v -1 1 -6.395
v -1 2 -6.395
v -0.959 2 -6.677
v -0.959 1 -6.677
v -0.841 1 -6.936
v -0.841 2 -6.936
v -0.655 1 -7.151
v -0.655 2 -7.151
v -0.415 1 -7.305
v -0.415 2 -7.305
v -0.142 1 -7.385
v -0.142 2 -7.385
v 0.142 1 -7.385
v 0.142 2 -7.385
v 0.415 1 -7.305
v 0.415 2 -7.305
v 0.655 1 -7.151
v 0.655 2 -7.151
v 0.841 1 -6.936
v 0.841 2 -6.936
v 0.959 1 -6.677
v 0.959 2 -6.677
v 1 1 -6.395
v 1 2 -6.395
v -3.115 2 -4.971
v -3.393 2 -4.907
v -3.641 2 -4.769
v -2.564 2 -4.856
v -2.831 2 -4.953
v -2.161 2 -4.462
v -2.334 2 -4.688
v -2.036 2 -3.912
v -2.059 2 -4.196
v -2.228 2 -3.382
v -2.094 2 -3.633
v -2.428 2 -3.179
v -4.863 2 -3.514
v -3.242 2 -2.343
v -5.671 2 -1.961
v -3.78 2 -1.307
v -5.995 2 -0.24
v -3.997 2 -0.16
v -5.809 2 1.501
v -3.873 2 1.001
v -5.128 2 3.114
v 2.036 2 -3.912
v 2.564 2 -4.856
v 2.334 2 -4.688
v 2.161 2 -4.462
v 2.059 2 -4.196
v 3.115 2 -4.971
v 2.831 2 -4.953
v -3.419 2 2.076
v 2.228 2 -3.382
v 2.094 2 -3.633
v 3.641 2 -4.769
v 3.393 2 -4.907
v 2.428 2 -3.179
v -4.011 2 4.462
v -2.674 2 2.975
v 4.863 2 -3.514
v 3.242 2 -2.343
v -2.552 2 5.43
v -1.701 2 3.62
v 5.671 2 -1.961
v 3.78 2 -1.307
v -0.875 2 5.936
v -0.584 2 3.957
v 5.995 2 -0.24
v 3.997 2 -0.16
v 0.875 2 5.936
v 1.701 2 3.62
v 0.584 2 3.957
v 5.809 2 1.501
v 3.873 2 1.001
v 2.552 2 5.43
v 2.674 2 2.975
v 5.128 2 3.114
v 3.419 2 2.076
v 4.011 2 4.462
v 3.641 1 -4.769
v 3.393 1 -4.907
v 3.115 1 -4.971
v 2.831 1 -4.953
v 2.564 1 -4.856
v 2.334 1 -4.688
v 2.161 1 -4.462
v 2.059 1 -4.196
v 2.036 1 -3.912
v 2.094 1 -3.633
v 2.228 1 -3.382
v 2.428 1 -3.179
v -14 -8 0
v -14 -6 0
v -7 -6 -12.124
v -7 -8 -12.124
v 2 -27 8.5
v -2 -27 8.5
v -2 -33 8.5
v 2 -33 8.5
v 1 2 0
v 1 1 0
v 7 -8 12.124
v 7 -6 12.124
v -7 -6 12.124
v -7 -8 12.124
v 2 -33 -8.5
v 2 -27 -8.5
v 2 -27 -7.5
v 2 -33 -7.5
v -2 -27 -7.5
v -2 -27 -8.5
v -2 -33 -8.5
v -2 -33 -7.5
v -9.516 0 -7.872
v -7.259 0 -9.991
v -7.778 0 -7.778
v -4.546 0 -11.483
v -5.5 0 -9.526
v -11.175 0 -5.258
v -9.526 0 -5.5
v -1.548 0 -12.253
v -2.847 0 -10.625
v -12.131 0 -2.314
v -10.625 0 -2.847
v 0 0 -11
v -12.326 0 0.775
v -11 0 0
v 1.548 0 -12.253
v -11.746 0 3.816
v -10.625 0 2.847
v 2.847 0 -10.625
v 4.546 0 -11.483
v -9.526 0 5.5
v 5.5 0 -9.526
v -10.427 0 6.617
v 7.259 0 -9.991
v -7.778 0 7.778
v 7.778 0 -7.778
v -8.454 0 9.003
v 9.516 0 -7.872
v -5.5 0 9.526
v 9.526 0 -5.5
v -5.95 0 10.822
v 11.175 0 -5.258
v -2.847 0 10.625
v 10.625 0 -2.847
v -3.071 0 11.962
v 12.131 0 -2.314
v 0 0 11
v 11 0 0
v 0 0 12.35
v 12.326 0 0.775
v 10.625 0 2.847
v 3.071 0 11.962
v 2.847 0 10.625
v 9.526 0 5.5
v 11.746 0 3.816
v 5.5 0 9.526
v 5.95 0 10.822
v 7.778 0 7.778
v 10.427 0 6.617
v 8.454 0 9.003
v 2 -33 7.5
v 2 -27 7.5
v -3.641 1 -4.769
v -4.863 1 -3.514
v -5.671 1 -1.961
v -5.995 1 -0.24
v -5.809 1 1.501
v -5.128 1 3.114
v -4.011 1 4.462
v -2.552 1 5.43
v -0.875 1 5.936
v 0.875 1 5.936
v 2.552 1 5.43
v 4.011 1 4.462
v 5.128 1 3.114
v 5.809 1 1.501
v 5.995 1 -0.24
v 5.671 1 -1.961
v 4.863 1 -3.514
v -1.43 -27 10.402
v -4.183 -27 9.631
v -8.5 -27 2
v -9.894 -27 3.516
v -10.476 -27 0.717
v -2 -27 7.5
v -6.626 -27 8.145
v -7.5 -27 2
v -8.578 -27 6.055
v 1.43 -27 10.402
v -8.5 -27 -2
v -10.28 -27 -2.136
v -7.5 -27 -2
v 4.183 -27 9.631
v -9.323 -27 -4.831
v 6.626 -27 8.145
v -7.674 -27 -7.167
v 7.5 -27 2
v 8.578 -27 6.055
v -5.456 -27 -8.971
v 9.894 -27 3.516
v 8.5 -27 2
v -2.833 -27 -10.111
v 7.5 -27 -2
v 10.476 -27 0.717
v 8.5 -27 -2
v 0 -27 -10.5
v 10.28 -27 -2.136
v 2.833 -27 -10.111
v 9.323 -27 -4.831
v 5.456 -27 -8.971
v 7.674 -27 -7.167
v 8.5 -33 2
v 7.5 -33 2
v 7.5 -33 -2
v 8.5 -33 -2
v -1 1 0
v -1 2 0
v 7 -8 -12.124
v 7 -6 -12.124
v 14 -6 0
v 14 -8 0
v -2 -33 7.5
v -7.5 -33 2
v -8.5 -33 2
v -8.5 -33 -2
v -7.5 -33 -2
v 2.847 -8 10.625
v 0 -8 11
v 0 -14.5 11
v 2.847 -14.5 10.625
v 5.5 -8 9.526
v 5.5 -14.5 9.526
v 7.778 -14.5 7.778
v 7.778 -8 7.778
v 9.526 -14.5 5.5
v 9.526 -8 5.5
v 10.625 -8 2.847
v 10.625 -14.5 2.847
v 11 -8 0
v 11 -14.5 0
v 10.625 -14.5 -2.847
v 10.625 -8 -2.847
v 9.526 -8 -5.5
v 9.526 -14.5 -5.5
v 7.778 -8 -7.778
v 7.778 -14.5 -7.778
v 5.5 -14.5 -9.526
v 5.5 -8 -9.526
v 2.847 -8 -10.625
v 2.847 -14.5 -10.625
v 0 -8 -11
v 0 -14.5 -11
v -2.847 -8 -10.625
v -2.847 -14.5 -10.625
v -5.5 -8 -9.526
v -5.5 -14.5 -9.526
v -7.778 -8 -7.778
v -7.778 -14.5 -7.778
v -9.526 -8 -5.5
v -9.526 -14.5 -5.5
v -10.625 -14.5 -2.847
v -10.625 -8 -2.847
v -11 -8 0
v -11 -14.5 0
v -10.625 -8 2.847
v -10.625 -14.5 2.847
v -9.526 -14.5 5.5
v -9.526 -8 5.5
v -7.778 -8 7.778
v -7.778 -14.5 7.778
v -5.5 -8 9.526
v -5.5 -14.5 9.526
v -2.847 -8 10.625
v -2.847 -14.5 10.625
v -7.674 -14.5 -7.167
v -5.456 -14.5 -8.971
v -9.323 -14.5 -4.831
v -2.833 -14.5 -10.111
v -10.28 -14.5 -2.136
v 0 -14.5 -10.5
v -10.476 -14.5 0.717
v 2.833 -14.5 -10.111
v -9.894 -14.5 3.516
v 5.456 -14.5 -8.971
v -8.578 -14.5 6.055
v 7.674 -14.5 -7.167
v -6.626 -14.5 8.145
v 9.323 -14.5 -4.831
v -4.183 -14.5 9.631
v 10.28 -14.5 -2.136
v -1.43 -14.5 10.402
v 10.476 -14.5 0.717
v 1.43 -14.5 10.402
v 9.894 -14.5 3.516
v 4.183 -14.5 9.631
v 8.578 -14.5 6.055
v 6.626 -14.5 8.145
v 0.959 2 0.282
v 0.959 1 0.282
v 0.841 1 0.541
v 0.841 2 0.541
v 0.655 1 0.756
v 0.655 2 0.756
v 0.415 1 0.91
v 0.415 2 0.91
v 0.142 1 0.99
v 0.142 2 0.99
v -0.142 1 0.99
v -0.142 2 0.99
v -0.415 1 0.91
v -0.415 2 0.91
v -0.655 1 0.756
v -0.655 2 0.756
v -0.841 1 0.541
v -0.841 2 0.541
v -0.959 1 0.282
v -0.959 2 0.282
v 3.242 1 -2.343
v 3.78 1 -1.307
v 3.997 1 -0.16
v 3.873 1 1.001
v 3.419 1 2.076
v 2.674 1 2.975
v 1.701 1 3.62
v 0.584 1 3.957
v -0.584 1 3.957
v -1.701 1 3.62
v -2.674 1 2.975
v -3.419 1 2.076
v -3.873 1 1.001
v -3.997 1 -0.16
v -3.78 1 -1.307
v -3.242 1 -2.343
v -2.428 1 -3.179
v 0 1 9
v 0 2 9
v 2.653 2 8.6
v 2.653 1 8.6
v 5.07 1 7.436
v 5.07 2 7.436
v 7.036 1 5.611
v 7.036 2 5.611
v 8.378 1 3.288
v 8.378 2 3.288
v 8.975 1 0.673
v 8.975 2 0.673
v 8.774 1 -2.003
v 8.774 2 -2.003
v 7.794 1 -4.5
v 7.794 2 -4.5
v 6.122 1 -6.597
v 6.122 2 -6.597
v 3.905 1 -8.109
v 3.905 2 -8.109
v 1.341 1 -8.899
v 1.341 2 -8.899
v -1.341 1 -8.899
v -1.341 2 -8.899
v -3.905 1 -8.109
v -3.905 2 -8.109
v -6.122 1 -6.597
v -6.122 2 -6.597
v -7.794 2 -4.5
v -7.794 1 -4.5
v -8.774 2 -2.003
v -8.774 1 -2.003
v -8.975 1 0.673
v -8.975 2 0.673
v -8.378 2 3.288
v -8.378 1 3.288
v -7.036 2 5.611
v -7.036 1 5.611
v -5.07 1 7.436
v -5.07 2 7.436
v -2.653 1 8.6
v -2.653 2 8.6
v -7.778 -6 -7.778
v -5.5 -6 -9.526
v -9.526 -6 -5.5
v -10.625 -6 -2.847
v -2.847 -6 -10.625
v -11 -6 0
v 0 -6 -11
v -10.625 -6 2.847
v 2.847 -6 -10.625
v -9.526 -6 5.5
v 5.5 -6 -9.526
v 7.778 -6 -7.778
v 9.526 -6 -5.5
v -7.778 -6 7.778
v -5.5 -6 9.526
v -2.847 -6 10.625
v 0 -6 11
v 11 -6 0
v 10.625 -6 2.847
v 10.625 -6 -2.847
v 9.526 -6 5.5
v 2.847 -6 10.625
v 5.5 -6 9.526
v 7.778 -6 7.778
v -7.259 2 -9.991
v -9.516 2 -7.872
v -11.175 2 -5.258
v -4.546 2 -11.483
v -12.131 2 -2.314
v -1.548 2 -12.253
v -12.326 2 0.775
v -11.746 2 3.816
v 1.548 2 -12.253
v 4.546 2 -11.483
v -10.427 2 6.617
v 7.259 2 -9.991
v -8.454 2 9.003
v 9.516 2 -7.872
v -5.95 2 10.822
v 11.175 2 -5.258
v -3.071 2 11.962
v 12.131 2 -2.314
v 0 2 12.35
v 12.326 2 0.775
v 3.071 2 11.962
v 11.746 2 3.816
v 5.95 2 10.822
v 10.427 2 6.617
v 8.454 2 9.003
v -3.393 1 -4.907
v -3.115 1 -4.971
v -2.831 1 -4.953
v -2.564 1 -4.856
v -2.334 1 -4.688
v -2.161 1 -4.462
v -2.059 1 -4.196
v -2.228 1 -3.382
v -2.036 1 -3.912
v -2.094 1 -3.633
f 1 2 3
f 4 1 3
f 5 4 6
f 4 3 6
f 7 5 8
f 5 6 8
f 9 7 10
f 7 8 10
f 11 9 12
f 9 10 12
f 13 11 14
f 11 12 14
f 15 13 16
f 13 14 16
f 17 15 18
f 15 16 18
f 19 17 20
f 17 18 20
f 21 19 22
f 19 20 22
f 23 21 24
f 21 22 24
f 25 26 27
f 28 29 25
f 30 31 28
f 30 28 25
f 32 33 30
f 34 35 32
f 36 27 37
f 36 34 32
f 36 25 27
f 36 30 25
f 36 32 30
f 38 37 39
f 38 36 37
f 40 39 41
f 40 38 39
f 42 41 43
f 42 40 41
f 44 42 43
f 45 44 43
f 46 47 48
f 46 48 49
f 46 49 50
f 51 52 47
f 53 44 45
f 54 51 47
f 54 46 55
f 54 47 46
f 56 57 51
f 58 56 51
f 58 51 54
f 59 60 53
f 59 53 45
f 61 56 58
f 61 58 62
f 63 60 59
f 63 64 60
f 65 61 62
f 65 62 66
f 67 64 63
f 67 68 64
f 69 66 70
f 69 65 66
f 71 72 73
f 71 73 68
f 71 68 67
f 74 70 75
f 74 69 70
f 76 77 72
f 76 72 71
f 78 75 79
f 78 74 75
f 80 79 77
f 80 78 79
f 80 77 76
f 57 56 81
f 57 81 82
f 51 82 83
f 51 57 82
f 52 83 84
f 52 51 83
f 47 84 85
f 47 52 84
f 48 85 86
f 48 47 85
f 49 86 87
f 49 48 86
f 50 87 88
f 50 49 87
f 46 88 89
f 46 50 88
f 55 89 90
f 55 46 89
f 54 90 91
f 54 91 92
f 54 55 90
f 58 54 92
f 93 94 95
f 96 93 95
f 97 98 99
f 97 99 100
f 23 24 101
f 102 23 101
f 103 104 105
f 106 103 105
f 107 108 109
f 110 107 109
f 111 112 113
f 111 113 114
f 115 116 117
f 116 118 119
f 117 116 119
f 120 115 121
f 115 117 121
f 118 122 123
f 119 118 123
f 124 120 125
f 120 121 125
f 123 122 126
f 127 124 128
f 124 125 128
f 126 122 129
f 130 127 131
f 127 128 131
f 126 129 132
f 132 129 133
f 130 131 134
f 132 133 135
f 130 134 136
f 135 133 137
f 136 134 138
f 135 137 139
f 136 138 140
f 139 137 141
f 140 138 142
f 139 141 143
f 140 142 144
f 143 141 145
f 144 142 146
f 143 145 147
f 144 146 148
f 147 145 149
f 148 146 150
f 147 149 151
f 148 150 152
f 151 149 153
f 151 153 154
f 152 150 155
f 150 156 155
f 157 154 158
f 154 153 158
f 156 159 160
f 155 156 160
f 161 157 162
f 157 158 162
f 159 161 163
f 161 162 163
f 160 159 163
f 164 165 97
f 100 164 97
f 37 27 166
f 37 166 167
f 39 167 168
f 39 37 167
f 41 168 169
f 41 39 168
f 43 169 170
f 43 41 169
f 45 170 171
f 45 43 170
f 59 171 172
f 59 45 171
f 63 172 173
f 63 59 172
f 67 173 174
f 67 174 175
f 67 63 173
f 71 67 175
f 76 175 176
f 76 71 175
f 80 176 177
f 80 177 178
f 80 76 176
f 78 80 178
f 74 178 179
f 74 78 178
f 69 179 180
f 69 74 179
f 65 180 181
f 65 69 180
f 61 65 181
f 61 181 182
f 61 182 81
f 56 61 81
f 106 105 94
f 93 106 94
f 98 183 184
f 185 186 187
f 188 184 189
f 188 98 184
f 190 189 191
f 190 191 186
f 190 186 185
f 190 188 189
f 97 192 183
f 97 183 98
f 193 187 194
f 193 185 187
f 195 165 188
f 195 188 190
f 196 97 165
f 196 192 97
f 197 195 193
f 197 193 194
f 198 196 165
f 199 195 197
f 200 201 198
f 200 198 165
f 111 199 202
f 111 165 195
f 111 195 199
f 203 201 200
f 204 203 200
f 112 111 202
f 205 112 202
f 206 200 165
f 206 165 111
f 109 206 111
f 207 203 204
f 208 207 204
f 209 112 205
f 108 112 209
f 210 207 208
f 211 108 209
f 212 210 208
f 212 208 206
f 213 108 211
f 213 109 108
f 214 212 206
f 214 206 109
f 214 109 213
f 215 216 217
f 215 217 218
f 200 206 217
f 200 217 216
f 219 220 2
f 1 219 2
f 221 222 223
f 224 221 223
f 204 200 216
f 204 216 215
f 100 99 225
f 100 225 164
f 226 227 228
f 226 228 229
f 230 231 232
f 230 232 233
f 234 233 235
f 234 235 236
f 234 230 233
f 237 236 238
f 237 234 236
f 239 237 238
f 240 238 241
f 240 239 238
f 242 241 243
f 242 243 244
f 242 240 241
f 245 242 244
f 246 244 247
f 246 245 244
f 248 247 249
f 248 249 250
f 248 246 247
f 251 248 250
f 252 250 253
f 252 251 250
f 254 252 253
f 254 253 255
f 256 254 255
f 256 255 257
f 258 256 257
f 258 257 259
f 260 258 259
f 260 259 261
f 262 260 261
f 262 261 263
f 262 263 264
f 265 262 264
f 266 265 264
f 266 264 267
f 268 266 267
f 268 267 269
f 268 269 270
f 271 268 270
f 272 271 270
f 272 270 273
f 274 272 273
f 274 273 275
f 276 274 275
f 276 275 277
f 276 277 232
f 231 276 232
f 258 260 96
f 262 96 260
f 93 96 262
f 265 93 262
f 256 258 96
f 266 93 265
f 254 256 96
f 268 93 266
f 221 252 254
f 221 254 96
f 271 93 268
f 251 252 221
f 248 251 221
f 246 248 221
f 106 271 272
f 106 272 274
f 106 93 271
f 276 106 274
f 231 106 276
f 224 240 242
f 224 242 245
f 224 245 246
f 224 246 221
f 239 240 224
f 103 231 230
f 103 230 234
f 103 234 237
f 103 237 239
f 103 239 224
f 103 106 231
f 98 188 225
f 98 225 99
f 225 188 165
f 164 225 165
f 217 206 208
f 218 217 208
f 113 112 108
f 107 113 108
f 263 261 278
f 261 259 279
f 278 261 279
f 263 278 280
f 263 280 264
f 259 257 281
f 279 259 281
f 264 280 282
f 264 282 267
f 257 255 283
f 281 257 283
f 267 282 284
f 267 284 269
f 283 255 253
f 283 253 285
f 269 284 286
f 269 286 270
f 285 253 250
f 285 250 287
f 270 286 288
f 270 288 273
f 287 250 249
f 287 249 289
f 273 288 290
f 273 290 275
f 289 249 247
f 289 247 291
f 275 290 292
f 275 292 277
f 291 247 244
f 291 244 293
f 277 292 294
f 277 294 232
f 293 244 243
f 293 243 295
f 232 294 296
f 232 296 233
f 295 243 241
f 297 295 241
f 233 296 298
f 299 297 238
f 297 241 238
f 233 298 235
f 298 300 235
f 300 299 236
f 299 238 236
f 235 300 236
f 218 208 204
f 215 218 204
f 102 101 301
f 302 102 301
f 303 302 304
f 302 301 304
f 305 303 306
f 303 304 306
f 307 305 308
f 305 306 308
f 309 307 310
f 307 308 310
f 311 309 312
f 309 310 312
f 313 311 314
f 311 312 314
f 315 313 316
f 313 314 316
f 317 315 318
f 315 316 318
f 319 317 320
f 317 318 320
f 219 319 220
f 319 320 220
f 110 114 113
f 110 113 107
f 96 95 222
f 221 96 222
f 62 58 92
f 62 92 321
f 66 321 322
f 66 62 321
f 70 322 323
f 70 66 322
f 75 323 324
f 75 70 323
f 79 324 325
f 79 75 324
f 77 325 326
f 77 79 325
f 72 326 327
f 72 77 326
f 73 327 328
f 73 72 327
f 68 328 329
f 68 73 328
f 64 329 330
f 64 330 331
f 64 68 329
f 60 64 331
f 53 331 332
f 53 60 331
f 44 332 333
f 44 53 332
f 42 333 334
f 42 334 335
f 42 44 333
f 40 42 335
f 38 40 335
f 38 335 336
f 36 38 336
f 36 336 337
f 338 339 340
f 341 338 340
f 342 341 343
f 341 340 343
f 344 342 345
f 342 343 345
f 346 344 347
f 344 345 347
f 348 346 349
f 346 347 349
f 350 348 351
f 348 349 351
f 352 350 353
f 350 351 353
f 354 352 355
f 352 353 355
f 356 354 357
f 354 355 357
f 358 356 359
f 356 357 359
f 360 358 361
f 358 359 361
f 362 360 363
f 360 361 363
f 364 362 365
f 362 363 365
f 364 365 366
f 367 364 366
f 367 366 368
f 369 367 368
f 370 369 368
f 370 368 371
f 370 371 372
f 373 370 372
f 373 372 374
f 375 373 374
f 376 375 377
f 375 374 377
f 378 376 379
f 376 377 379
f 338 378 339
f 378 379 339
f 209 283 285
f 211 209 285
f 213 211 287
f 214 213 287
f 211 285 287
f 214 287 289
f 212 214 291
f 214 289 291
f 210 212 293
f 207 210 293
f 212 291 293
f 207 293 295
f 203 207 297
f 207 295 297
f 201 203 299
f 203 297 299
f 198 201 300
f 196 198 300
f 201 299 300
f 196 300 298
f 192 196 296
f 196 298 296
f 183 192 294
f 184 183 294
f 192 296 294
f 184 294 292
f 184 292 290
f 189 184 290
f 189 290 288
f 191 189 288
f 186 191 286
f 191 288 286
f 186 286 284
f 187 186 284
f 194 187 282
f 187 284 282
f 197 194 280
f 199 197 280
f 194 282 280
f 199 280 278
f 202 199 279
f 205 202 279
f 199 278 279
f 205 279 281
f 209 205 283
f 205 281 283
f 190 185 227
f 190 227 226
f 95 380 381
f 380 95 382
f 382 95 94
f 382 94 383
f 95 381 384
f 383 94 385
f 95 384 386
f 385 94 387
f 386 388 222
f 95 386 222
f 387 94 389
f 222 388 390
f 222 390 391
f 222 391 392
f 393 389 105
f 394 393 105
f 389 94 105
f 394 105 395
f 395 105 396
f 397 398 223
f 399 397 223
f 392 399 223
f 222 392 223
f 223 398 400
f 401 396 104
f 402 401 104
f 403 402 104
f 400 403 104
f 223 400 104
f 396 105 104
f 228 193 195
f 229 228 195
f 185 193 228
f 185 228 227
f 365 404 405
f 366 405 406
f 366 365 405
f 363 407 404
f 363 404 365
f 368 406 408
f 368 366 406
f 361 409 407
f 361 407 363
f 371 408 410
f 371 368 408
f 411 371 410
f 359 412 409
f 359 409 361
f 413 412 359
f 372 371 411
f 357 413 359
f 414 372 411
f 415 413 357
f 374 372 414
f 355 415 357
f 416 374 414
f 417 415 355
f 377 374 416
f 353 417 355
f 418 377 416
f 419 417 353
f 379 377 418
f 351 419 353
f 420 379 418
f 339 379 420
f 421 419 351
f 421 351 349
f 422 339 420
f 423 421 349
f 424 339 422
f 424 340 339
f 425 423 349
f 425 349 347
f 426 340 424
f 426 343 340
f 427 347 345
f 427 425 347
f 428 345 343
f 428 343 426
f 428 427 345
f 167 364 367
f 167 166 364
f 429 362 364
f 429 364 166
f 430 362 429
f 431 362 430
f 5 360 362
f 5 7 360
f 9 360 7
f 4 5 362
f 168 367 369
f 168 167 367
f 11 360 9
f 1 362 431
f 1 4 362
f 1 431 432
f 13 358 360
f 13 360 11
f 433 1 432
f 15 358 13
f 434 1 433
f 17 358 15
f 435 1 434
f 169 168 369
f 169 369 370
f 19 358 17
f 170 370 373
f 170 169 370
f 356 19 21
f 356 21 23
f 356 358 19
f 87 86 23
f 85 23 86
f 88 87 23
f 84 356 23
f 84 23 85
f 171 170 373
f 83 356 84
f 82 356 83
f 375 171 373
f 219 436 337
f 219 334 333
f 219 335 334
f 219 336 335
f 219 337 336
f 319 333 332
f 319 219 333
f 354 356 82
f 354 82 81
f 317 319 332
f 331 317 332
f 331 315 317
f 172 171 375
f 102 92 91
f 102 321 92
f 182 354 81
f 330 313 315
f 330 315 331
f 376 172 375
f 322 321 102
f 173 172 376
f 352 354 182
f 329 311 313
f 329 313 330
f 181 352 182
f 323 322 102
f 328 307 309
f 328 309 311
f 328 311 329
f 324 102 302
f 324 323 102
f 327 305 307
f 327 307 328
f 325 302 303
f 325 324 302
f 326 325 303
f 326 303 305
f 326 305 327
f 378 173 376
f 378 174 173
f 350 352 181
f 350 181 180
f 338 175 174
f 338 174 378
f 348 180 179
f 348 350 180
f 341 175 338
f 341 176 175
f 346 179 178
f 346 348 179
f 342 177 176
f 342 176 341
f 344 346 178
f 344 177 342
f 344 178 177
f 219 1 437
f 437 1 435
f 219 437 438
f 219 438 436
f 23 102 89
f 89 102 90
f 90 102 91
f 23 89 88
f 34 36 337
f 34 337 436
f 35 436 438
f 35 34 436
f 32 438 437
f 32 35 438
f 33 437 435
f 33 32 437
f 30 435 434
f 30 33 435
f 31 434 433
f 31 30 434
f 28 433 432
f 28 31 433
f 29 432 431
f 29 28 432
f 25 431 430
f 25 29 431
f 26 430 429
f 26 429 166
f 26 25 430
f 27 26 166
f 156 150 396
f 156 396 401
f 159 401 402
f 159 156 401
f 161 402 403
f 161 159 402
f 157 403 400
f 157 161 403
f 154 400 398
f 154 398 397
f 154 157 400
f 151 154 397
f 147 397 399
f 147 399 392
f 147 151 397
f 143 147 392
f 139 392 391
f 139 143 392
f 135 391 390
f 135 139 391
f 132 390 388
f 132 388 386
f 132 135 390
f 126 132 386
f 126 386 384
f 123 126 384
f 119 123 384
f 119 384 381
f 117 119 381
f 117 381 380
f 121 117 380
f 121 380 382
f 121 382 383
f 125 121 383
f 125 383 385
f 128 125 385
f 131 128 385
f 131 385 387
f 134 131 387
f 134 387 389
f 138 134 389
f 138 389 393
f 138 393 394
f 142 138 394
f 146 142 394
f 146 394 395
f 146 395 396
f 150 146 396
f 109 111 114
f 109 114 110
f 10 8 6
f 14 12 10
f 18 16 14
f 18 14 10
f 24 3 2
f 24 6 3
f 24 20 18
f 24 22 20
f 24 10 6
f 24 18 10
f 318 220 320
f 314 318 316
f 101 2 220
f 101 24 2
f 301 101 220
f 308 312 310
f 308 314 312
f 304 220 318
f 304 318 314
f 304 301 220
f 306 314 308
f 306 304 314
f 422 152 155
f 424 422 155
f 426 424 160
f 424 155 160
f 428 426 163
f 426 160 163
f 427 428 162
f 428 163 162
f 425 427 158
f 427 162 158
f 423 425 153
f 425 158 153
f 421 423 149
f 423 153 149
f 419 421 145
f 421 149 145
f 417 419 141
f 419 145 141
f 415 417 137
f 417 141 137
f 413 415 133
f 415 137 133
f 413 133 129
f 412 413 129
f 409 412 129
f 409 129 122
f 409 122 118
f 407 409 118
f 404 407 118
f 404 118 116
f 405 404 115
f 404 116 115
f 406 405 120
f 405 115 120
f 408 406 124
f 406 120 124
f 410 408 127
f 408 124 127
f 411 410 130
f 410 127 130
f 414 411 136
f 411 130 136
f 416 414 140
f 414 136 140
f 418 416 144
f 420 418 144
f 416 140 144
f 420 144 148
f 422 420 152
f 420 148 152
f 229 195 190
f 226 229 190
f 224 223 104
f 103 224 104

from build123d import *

# Parameters (mm, degrees)
ESQUISSE1_R             = 11
BOSS_EXTRU_1_DEPTH      = 14.5
ESQUISSE2_R             = 12.35
BOSS_EXTRU_2_DEPTH      = 2
ESQUISSE3_R             = 9
ENL_V_MAT_EXTRU_1_DEPTH = 1
ESQUISSE4_R             = 10.5
BOSS_EXTRU_3_DEPTH      = 12.5
ESQUISSE5_W             = 1
ESQUISSE5_H             = 4
ESQUISSE5_W_2           = 4
ESQUISSE5_H_2           = 1
BOSS_EXTRU_4_DEPTH      = 6
BOSS_EXTRU_5_START      = 6
BOSS_EXTRU_5_DEPTH      = 2


with BuildPart() as part:
    # Esquisse1 → Boss.-Extru.1 (new body)
    with BuildSketch(Plane(origin=(0, 0, 0), x_dir=(1, 0, 0), z_dir=(0, 1, 0))):
        with Locations(Location((0, 0, 0), (0, 0, 270))):
            Circle(ESQUISSE1_R)
    extrude(amount=-BOSS_EXTRU_1_DEPTH)

    # Esquisse2 → Boss.-Extru.2 (add)
    with BuildSketch(Plane(origin=(0, 0, 0), x_dir=(1, 0, 0), z_dir=(0, 1, 0))):
        with Locations(Location((0, 0, 0), (0, 0, 270))):
            Circle(ESQUISSE2_R)
    extrude(amount=BOSS_EXTRU_2_DEPTH)

    # Esquisse3 → Enlèv. mat.-Extru.1 (cut)
    with BuildSketch(Plane(origin=(0, 2, 0), x_dir=(1, 0, 0), z_dir=(0, 1, 0))):
        with Locations(Location((0, 0, 0), (0, 0, 270))):
            Circle(ESQUISSE3_R)
        with BuildLine():
            Line((-1, 0), (-1, 6.394930003))
            ThreePointArc((-1, 6.394930003), (0, 7.394930003), (1, 6.394930003))
            Line((1, 6.394930003), (1, 0))
            ThreePointArc((1, 0), (0, -1), (-1, 0))
        make_face(mode=Mode.SUBTRACT)
        with BuildLine():
            ThreePointArc((-3.641353304, 4.768704868), (0, -6), (3.641353304, 4.768704868))
            ThreePointArc((3.641353304, 4.768704868), (2.239676942, 4.58081294), (2.427568869, 3.179136578))
            ThreePointArc((2.427568869, 3.179136578), (0, -4), (-2.427568869, 3.179136578))
            ThreePointArc((-2.427568869, 3.179136578), (-2.239676942, 4.58081294), (-3.641353304, 4.768704868))
        make_face(mode=Mode.SUBTRACT)
    extrude(amount=-ENL_V_MAT_EXTRU_1_DEPTH, mode=Mode.SUBTRACT)

    # Esquisse4 → Boss.-Extru.3 (add)
    with BuildSketch(Plane.XZ.offset(14.5)):
        with Locations(Location((0, 0, 0), (0, 0, 270))):
            Circle(ESQUISSE4_R)
    extrude(amount=BOSS_EXTRU_3_DEPTH)

    # Esquisse5 → Boss.-Extru.4 (add)
    with BuildSketch(Plane.XZ.offset(27)):
        with Locations((-8, 0)):
            Rectangle(ESQUISSE5_W, ESQUISSE5_H)
        with Locations((0, 8)):
            Rectangle(ESQUISSE5_W_2, ESQUISSE5_H_2)
        with Locations((0, -8)):
            Rectangle(ESQUISSE5_W_2, ESQUISSE5_H_2)
        with Locations((8, 0)):
            Rectangle(ESQUISSE5_W, ESQUISSE5_H)
    extrude(amount=BOSS_EXTRU_4_DEPTH)

    # Esquisse6 → Boss.-Extru.5 (add)
    with BuildSketch(Plane.XZ.offset(BOSS_EXTRU_5_START)):
        Polygon((14, 0), (7, 12.124355653), (-7, 12.124355653), (-14, 0), (-7, -12.124355653), (7, -12.124355653), align=None)
    extrude(amount=BOSS_EXTRU_5_DEPTH)


solid = part.part
